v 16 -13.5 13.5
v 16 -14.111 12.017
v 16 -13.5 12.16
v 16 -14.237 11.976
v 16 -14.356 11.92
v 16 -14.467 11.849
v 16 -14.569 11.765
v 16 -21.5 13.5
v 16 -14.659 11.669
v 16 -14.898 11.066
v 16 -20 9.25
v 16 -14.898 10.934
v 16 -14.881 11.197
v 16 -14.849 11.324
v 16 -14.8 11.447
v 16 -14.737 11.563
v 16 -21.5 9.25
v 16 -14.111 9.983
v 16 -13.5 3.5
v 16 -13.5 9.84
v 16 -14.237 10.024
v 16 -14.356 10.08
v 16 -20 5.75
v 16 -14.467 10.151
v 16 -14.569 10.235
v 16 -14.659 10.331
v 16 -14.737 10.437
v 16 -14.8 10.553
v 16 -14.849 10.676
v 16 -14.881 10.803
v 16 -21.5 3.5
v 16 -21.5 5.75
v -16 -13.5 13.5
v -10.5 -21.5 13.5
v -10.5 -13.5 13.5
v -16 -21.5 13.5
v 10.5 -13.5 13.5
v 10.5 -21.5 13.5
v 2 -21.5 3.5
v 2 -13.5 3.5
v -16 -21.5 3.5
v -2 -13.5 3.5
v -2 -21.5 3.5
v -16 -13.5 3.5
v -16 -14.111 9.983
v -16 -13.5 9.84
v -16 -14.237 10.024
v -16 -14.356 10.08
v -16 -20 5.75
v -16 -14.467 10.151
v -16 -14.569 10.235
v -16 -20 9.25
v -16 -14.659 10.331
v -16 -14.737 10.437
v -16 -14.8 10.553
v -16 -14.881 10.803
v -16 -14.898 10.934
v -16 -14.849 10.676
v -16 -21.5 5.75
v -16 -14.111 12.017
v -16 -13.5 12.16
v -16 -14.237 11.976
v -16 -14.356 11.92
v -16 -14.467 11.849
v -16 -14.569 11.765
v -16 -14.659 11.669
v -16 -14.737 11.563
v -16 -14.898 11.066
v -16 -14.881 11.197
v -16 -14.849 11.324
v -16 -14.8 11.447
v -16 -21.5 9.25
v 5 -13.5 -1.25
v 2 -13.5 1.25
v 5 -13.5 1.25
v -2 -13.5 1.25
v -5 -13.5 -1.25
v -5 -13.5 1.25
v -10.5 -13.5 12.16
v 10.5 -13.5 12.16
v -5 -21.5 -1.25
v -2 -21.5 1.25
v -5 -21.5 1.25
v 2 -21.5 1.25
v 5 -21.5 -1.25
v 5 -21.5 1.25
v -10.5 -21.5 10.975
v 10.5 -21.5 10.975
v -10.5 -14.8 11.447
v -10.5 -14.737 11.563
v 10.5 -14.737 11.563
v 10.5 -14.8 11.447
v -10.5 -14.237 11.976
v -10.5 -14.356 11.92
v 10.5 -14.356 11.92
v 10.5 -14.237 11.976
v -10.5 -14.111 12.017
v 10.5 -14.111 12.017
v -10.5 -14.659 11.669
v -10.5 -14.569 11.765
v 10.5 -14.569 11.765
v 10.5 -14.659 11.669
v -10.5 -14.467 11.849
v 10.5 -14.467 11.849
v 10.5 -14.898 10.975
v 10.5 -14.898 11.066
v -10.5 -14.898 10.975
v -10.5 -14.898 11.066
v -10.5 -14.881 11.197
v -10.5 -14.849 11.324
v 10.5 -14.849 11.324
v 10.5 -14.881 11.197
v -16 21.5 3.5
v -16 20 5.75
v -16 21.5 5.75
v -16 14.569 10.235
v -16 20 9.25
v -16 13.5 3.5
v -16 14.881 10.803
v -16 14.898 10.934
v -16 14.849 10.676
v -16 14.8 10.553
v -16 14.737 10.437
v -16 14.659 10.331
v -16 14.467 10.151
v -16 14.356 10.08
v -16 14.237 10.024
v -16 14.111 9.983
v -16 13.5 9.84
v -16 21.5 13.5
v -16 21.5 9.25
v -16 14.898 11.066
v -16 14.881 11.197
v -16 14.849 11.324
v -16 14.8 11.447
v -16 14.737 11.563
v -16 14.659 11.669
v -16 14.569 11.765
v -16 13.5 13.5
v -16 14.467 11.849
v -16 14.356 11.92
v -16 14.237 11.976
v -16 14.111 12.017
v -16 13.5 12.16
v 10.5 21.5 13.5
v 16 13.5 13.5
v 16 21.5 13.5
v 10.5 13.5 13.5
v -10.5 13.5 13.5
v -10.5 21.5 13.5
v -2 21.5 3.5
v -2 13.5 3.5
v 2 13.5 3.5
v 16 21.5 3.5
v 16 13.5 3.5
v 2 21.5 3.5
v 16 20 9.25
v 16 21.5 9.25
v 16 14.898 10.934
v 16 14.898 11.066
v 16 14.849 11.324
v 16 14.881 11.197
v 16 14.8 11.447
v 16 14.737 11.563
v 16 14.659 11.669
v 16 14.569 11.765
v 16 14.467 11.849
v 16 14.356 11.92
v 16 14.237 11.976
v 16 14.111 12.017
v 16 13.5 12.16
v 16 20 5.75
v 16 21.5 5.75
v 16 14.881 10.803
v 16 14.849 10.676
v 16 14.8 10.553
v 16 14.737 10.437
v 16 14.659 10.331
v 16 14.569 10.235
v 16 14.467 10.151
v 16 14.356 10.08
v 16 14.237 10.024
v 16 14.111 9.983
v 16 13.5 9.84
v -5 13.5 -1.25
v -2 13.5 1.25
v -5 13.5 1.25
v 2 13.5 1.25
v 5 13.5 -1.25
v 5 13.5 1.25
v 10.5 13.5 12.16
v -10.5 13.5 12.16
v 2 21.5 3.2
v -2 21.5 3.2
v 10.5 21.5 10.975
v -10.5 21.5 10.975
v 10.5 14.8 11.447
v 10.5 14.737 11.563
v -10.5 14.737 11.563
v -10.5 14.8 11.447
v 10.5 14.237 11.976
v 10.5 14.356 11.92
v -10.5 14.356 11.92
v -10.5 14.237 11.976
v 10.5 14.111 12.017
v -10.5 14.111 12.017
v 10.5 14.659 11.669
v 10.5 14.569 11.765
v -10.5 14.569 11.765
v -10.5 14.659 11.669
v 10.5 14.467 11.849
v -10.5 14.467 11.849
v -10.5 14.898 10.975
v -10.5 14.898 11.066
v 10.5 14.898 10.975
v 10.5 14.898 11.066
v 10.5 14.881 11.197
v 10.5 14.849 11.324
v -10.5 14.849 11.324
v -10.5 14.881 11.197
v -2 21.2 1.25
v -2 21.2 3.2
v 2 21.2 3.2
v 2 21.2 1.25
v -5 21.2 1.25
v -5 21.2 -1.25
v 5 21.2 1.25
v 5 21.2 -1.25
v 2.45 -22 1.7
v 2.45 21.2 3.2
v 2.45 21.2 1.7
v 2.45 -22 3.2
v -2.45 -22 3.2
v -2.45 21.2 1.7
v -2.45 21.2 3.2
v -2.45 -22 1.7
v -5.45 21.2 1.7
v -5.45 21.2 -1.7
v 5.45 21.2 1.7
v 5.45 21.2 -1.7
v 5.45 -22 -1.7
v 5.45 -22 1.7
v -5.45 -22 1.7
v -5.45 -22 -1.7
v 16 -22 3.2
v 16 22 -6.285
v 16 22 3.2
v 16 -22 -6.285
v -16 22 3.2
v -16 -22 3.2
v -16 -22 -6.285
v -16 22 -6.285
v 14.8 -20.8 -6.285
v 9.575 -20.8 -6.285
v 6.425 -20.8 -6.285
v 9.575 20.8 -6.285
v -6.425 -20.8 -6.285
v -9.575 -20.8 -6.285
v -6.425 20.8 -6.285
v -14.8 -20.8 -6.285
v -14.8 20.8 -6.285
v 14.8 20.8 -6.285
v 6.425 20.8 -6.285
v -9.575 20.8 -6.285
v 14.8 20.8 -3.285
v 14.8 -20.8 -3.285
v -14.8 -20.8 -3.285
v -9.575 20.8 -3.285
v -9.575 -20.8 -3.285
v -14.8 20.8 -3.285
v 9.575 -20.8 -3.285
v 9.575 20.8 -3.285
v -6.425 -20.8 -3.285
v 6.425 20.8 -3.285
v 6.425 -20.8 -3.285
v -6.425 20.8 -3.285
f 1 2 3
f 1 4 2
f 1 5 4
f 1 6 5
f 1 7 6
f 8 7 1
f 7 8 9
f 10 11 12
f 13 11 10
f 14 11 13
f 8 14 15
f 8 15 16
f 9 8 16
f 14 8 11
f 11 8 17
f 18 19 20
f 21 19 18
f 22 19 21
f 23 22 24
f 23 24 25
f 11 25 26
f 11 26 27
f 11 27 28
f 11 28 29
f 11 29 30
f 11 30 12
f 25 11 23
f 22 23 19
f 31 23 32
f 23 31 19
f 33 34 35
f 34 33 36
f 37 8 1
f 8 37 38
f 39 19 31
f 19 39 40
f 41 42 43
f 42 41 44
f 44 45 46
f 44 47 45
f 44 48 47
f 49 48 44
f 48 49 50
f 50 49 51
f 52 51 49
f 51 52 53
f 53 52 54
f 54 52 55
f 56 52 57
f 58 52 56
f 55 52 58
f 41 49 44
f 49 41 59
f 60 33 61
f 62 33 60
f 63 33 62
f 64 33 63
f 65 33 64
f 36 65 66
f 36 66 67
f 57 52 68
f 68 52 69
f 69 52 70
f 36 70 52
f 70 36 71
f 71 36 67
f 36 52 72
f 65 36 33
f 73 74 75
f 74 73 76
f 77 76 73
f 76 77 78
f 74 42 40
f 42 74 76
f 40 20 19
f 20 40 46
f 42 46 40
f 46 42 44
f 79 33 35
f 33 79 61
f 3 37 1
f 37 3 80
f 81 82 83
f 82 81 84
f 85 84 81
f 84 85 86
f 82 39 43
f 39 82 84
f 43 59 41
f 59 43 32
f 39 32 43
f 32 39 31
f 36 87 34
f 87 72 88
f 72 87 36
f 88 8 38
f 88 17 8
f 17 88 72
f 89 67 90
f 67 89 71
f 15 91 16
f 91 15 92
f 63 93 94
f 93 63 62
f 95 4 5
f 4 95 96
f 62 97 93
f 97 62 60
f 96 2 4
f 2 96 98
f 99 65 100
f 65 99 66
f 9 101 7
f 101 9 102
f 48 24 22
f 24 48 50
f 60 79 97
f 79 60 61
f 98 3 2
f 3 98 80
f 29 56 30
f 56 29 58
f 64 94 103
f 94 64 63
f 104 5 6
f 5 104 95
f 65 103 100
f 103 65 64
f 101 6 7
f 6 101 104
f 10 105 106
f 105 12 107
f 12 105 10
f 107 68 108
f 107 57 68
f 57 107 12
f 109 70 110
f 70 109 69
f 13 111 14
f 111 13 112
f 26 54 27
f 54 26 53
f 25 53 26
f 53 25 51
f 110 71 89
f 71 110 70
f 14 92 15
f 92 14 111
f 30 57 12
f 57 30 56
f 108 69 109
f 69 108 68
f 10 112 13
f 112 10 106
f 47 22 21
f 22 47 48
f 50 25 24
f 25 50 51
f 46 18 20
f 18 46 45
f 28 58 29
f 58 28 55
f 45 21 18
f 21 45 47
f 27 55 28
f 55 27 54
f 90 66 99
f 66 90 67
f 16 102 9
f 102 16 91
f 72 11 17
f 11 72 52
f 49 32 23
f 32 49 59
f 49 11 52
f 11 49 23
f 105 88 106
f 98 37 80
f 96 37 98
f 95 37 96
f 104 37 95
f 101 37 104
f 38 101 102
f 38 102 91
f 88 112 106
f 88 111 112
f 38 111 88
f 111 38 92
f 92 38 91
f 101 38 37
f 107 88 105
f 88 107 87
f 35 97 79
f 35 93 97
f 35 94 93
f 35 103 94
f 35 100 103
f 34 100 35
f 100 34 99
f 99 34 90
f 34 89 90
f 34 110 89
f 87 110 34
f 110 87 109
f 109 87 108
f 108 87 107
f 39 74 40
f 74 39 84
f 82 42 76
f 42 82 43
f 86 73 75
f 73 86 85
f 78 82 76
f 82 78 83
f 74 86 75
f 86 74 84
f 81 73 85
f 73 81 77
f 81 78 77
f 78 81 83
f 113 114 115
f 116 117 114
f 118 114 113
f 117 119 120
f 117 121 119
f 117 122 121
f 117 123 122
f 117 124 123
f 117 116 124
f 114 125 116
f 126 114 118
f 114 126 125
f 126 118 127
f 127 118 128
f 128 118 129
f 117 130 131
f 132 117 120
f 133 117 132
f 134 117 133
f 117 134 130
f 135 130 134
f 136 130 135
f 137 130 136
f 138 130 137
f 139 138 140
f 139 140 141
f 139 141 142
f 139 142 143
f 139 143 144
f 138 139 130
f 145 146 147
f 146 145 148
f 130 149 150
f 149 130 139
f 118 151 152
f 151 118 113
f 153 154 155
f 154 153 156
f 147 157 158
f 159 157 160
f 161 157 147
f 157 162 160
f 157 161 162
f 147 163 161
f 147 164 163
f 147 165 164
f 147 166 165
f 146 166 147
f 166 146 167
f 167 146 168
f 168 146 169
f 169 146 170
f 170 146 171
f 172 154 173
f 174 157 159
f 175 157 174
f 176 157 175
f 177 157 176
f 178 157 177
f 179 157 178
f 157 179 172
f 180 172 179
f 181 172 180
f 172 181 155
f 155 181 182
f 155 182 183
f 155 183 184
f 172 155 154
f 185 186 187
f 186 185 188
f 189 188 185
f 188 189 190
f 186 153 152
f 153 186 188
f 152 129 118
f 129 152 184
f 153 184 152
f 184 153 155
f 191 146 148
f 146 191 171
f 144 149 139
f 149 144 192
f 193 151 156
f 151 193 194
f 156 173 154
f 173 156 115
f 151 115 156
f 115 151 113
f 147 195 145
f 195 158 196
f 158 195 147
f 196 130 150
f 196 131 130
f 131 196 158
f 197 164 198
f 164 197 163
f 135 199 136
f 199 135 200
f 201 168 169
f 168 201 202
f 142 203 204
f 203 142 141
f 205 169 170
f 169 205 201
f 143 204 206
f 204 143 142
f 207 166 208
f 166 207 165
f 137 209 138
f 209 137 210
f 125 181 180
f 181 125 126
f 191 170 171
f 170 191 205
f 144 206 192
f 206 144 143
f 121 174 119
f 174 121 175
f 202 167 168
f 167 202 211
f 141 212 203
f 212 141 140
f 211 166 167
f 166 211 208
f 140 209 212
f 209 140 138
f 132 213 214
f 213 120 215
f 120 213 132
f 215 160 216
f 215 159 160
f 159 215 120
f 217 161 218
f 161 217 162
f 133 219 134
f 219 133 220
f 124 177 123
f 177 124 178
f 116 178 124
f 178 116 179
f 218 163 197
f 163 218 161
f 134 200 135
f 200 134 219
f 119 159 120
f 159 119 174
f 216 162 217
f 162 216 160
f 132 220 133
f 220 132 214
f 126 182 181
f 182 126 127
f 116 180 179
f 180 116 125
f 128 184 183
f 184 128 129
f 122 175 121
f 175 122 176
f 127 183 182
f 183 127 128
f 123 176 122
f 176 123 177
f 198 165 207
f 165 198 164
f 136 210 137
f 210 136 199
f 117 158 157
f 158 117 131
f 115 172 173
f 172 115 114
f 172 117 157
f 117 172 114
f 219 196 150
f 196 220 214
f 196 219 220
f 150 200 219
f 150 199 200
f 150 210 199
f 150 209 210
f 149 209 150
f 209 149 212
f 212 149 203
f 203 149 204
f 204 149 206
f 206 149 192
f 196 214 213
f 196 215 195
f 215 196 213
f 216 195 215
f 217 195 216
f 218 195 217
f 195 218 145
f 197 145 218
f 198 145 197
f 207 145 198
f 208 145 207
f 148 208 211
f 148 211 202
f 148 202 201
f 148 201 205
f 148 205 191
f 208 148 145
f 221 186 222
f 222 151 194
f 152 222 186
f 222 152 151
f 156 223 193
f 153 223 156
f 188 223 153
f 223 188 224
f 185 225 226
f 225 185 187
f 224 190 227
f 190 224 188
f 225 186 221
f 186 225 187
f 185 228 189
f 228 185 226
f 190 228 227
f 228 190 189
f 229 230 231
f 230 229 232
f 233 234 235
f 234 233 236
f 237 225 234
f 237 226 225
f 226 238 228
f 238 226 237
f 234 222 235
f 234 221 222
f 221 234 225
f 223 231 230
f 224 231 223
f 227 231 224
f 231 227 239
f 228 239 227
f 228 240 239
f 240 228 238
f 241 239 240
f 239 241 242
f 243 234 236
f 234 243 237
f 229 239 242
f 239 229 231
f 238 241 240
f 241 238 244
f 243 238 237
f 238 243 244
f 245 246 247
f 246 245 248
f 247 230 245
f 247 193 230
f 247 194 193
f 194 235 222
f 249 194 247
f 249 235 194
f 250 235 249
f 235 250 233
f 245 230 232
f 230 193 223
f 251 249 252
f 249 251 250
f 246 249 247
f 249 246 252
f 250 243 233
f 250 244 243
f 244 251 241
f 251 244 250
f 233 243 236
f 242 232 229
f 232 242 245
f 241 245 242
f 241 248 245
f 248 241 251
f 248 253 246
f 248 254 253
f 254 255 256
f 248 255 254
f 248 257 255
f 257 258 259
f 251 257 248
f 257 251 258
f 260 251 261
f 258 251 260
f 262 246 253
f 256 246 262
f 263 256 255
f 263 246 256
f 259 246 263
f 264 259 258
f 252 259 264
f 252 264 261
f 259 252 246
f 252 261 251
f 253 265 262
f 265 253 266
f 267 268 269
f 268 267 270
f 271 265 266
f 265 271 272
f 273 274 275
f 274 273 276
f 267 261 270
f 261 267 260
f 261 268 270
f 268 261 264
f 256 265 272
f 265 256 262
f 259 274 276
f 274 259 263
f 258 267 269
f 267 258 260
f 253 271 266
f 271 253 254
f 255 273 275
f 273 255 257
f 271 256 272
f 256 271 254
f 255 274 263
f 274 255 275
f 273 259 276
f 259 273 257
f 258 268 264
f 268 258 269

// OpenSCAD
/*
 * Component Holder.scad
 *
 *
 * NOTES:
 *
 * There are two different parts, the Track (with LEGO compatible fittings
 * on the bottom) and the Jaws which slide in the groove of the track and 
 * are held tight using a rubber band.
 *
 * You will need to print one track and two jaws.
 *
 * The track should be printed standing on end, and the jaws should be 
 * printed face down (with the curved PCB groove) on the bed.
 *
 * INSTRUCTIONS:
 *
 * 1. In the RENDER section set beautyRender to 1 and the rest to 0
 * 
 * 2. In SETTINGS set componentX and componentY to the size of the 
 *    PCB of the component you will be using.
 *
 * 3. In SETTINGS adjust brickX and brickY to be sized appropriately 
 *    to fit the component you added in the first step.
 * 
 * 4. If needed, change slotWidth to a number above 0 to accommodate 
 *    elements that may need clearance on the jaws.
 * 
 * 5. In the RENDER section set only trackRender to 1 and then export
 *    that, and then do the same for jawRender.
 *
 * 
 * Pete Prodoehl <pete@browndoggadgets.com>
 *
 */


/* --- SETTIINGS ---------------------------------------------------------------------------- */

// set the size of the component
componentX = 28;
componentY = 27;

// adjust for the size you need to hold the component
brickX = 4;
brickY = 5.5;

// do not change these values
trackWidth  = brickX * 8;   // do not change
trackLength = brickY * 8;   // do not change
trackHeight = 5.5;          // do not change
trackMidX   = 4;            // do not change
trackMidZ   = 5;            // do not change
trackBotX   = 10;           // do not change
trackBotZ   = 2.5;          // do not change

// adjust if desired to change the width of the jaws
jawWidth = trackWidth;

// adjusting only affects preview of jaws if needed
jawPreviewSpace = 4.5;  // default to 4.5

// add a slot in the jaw for some components if needed
slotWidth = 21; // set to 0 for no slot

$fn=50;


/* --- RENDER ------------------------------------------------------------------------------- */


// toggle these to affect the preview and rendering
trackRender  = 0;
jawRender    = 0;
beautyRender = 1;



// render commands
if (jawRender) {
	translate([0,0,0/2]) jawPart();
}
if (trackRender) {
	translate([0,0,0/2]) trackPart();
}
if (beautyRender) {
	translate([0,-trackLength/2+jawPreviewSpace,0]) rotate([0,0,0])   color("#0066FF") jawPart();
	translate([0,+trackLength/2-jawPreviewSpace,0]) rotate([0,0,180]) color("#0066FF") jawPart();
	translate([0,0,0]) color("#99AA00") trackPart();
	%translate([0,0,11]) cube([componentX,componentY,1.6], center=true); // component size here
}



/* --- MODULES ------------------------------------------------------------------------------ */

// jawPart is the jaws which hold the component...
//
module jawPart() {

    difference() {
        
        // top of jaw with PCB and rubber band slot cutouts
        translate([0,0,8.5])
            cube([jawWidth,8,10], center=true);
            
        // PCB slot
        hull() {
        
            translate([0,4.75,11])
                rotate([0,90,0])
                    cylinder(d=2.6, h=jawWidth+0.01, center=true);

            translate([0,3.65,11])
                rotate([0,90,0])
                    cylinder(d=2.1, h=jawWidth+0.01, center=true);                
                
        }
            
        // rubber band slot
        translate([0,-4.5,7.5])
            cube([jawWidth+0.01,4,3.5], center=true);
            
        // slot if included
        translate([0,0,13.85])
            cube([slotWidth,10,5.75], center=true);
      
    }

	// inverted T at the bottom of the jaw
    translate([0,0,0])
        guidePart();

}

/* ------------------------------------------------------------------------------------------ */

// trackPart is the basic track sized as specified
// with the guideSlot cut out from it...
//
module trackPart() {
    
    difference() {

        translate([0,0,-trackHeight/2+3.2])
            cube([trackWidth,trackLength,trackHeight], center=true);
            
        translate([0,-0.8,0])
           guideSlot();

    }
    
    // LEGO compatible bottom portion
    translate([0,0,-4.285])
        Lego_Maker(brickY, brickX);
	
} // end trackPart

/* ------------------------------------------------------------------------------------------ */

// guidePart is the inverted T at the bottom of the jaw that fits into the slot/groove
// in the trackPart which gets created by cutting out the guideSlot...
//
module guidePart() {

    variance = 0;
    trackLength = 8; 

    // middle
    translate([0,0,3])
        color("#00FF33")
            cube([trackMidX+variance,trackLength,trackMidZ+variance], center=true);
    
    // bottom
    translate([0,0,0])
        color("#33AA66")
            cube([trackBotX+variance,trackLength,trackBotZ+variance], center=true);
        
}  // end guidePart

/* ------------------------------------------------------------------------------------------ */

// guideSlot is the cutout part from the trackPart which creates the slot/groove 
// that the guidePart fits into and slides in...
//
module guideSlot() {
    
    variance = 0.9;
    
    // middle
    translate([0,0,3])
        color("#996600")
            cube([trackMidX+variance,trackLength,trackMidZ+variance], center=true);
            
    // bottom
    translate([0,0,0])
        color("#999900")
            cube([trackBotX+variance,trackLength,trackBotZ+variance], center=true);
        
}  // end guideSlot

/* ------------------------------------------------------------------------------------------ */

// Lego_Maker creates the modified LEGO brick-like part at the bottom of the holder...
//
module Lego_Maker(width, length) {

	unit_height   = 4;    // height of main brick
	unit_width    = 8;    // width of one LEGO Unit
    wall_width_x2 = 3.15; // double wall width
    
    difference() {
    
        translate([0,0,0])
            cube([length*unit_width, width*unit_width, unit_height], center=true);
    
        translate([0,0,-1])
            cube([length*unit_width-2.4, width*unit_width-2.4, unit_height], center=true);

    }
    
    translate([trackWidth/2-unit_width,0,0])
        cube([wall_width_x2, width*unit_width, unit_height], center=true);
        
    translate([-trackWidth/2+unit_width,0,0])
        cube([wall_width_x2, width*unit_width, unit_height], center=true);

}  // end Lego_Maker

/* ------------------------------------------------------------------------------------------ */
